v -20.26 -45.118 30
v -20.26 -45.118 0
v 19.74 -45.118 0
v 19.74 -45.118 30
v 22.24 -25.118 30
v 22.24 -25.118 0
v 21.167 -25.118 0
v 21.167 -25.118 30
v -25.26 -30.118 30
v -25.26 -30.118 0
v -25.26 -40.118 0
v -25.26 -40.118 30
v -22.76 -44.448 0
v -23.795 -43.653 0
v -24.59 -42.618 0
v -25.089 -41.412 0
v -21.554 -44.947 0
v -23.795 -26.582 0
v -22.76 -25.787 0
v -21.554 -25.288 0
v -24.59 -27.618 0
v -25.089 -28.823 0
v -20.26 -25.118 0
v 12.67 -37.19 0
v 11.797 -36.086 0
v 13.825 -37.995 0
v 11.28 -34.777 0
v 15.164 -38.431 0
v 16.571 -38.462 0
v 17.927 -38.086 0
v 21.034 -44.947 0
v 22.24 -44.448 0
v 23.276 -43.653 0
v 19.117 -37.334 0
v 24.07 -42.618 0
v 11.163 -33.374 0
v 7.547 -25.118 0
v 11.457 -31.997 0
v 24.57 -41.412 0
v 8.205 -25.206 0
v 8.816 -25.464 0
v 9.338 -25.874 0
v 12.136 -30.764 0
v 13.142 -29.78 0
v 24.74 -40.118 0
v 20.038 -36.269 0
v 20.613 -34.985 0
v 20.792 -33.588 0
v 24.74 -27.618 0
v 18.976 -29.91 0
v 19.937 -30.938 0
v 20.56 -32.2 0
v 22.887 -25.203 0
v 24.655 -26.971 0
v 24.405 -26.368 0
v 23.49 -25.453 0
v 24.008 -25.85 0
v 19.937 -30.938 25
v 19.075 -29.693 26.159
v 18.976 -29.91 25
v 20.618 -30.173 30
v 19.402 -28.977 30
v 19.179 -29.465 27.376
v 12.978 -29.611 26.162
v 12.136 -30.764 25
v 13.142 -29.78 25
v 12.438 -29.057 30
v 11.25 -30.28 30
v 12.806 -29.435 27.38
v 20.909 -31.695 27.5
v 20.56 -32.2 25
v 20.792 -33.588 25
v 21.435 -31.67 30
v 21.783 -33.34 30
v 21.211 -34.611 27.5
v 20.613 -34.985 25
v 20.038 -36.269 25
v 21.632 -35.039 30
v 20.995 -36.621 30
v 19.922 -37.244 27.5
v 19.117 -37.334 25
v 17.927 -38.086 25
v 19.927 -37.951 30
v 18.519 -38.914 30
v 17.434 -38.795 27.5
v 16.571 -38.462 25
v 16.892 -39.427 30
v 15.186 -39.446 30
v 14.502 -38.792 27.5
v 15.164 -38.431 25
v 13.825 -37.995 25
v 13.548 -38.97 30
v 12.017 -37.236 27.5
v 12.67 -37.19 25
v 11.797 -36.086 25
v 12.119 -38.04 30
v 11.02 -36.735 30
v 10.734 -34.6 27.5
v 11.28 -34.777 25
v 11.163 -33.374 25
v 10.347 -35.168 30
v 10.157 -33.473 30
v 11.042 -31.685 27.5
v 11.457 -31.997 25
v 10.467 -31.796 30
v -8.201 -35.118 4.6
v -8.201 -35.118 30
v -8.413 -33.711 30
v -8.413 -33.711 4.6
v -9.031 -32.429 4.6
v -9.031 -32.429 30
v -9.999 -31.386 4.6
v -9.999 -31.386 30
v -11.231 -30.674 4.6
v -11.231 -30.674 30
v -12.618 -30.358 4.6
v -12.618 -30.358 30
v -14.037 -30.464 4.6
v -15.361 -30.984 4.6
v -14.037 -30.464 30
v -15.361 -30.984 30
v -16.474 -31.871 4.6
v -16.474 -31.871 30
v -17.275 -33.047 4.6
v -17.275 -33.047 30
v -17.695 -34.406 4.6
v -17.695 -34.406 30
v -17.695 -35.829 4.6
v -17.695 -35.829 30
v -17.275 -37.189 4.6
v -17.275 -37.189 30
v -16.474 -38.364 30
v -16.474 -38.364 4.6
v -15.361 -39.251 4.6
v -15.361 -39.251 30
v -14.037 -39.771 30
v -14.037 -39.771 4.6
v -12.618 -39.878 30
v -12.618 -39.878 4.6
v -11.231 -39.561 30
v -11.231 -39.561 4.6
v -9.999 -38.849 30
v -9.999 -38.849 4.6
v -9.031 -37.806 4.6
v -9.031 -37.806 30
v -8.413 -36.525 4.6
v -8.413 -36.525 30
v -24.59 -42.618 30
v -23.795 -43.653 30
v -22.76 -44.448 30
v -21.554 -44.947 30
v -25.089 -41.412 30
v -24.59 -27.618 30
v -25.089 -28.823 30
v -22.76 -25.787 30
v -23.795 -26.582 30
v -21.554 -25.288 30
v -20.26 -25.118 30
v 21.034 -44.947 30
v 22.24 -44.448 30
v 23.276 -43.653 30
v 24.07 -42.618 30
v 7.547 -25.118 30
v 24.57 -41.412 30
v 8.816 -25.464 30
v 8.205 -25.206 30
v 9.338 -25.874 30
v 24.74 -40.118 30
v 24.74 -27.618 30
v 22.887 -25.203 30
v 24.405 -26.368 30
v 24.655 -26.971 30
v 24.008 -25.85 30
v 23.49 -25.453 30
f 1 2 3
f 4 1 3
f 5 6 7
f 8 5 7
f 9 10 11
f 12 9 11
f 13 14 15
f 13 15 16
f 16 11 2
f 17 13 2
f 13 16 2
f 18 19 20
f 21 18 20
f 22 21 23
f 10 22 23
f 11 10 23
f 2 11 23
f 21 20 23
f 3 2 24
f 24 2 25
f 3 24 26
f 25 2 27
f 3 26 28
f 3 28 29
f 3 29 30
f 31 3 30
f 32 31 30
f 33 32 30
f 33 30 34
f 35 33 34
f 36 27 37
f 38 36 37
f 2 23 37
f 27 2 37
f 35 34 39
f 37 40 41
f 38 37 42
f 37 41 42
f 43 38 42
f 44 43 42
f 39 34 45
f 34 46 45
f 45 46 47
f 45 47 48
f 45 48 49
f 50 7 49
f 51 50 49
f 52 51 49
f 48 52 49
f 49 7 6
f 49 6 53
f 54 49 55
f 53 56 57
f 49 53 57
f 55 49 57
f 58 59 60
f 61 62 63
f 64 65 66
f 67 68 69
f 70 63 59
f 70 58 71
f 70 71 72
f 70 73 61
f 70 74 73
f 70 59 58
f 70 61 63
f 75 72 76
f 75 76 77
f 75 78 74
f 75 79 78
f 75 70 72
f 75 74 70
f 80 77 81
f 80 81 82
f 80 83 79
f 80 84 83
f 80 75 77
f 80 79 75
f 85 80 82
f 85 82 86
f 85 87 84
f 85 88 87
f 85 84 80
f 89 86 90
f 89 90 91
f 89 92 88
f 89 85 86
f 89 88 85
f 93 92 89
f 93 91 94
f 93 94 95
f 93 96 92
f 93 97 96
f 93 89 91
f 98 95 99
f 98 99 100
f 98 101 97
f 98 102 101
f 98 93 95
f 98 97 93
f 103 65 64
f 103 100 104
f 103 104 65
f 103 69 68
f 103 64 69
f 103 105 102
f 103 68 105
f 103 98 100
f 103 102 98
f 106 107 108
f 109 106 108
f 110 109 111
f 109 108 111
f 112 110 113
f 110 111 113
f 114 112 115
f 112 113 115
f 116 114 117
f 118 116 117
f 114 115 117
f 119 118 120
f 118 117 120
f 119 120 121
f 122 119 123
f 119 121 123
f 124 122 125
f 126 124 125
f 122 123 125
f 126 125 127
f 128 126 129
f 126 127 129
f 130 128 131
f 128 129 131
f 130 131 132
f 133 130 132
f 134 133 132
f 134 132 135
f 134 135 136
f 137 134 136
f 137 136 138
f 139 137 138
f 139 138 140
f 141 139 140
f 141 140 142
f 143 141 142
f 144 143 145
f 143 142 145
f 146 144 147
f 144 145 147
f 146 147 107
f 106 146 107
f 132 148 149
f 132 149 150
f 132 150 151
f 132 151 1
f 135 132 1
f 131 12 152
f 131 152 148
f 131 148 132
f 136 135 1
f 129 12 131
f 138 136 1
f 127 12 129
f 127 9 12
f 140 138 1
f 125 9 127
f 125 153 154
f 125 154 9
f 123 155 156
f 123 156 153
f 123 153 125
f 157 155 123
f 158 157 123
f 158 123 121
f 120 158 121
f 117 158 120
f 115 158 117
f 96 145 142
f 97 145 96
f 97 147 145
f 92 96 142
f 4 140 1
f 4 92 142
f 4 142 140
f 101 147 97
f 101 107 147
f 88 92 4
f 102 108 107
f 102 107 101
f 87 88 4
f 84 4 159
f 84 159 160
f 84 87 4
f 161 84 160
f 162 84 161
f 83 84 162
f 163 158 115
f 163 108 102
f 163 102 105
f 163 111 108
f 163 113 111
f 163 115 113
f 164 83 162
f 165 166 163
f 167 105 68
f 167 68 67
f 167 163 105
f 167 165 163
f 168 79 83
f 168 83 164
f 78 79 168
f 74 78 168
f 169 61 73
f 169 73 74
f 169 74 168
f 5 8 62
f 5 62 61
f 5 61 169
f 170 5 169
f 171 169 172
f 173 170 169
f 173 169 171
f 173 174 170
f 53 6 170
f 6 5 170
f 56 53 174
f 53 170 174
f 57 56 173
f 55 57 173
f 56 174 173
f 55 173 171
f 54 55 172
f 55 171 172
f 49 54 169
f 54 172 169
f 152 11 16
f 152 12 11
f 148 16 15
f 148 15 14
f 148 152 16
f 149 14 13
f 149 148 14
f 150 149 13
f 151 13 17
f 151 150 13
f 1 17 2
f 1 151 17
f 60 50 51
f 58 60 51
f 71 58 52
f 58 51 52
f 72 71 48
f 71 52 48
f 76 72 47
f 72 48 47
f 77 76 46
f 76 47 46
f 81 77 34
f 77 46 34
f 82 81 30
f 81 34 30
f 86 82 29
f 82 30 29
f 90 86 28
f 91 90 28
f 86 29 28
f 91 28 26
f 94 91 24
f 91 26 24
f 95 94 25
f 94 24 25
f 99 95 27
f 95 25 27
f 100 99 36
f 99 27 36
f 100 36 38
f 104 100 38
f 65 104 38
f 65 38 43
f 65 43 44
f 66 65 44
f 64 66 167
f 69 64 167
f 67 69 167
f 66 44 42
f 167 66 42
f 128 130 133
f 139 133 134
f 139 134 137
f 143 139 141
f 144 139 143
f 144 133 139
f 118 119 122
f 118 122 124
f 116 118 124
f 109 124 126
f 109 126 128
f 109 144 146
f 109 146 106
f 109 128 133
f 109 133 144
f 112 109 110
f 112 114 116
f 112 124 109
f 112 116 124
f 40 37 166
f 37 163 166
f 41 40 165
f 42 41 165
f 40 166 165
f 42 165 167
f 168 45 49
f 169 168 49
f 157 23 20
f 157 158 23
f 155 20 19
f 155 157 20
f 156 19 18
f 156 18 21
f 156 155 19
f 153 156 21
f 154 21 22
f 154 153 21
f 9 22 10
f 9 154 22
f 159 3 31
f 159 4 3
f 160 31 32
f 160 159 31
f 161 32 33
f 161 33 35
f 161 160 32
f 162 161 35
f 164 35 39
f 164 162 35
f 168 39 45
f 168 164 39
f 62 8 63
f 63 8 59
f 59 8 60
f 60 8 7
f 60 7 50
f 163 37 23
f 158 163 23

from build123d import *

# Parameters (mm, degrees)
F1_DEPTH = 30
F2_R     = 5
F3_R     = 2.5
F4_SIZE2 = 1
F4_SIZE  = 5
F5_R     = 4.7732777186
F6_DEPTH = 25.4


with BuildPart() as f1:
    # F0 (on Top) → F1 (new body)
    with BuildSketch(Plane.XY):
        with BuildLine():
            Line((8.6023872718, -25.1175931746), (-25.2596801519, -25.1175931746))
            Line((-25.2596801519, -25.1175931746), (-25.2596801519, -45.1175931746))
            Line((-25.2596801519, -45.1175931746), (24.7403198481, -45.1175931746))
            Line((24.7403198481, -45.1175931746), (24.7403198481, -25.1175931746))
            Line((24.7403198481, -25.1175931746), (21.1665723473, -25.1175931746))
            Line((21.1665723473, -25.1175931746), (18.9759883363, -29.909516218))
            ThreePointArc((18.9759883363, -29.909516218), (15.8660389828, -38.4984737312), (13.1416287482, -29.7795537856))
            Line((13.1416287482, -29.7795537856), (8.6023872718, -25.1175931746))
        make_face()
    extrude(amount=F1_DEPTH)

    # F2
    f2_edges = [f1.edges().sort_by_distance(p)[0] for p in [
        (-25.25968, -25.117593, 15),
        (-25.25968, -45.117593, 15),
        (24.74032, -45.117593, 15),
    ]]
    fillet(f2_edges, radius=F2_R)

    # F3
    f3_edges = [f1.edges().sort_by_distance(p)[0] for p in [
        (24.74032, -25.117593, 15),
        (8.602387, -25.117593, 15),
    ]]
    fillet(f3_edges, radius=F3_R)

    # F4
    f4_edges = [f1.edges().sort_by_distance(p)[0] for p in [
        (15.866039, -38.498474, 30),
    ]]
    f4_side = f1.faces().sort_by_distance((15.866039, -38.498474, 15))[0]
    chamfer(f4_edges, length=F4_SIZE, length2=F4_SIZE2, reference=f4_side)

    # F5 (on face) → F6 (cut)
    with BuildSketch(Plane.XY.offset(30)):
        with Locations((-12.9745947197, -35.1175931746)):
            Circle(F5_R)
    extrude(amount=-F6_DEPTH, mode=Mode.SUBTRACT)


solid = f1.part
